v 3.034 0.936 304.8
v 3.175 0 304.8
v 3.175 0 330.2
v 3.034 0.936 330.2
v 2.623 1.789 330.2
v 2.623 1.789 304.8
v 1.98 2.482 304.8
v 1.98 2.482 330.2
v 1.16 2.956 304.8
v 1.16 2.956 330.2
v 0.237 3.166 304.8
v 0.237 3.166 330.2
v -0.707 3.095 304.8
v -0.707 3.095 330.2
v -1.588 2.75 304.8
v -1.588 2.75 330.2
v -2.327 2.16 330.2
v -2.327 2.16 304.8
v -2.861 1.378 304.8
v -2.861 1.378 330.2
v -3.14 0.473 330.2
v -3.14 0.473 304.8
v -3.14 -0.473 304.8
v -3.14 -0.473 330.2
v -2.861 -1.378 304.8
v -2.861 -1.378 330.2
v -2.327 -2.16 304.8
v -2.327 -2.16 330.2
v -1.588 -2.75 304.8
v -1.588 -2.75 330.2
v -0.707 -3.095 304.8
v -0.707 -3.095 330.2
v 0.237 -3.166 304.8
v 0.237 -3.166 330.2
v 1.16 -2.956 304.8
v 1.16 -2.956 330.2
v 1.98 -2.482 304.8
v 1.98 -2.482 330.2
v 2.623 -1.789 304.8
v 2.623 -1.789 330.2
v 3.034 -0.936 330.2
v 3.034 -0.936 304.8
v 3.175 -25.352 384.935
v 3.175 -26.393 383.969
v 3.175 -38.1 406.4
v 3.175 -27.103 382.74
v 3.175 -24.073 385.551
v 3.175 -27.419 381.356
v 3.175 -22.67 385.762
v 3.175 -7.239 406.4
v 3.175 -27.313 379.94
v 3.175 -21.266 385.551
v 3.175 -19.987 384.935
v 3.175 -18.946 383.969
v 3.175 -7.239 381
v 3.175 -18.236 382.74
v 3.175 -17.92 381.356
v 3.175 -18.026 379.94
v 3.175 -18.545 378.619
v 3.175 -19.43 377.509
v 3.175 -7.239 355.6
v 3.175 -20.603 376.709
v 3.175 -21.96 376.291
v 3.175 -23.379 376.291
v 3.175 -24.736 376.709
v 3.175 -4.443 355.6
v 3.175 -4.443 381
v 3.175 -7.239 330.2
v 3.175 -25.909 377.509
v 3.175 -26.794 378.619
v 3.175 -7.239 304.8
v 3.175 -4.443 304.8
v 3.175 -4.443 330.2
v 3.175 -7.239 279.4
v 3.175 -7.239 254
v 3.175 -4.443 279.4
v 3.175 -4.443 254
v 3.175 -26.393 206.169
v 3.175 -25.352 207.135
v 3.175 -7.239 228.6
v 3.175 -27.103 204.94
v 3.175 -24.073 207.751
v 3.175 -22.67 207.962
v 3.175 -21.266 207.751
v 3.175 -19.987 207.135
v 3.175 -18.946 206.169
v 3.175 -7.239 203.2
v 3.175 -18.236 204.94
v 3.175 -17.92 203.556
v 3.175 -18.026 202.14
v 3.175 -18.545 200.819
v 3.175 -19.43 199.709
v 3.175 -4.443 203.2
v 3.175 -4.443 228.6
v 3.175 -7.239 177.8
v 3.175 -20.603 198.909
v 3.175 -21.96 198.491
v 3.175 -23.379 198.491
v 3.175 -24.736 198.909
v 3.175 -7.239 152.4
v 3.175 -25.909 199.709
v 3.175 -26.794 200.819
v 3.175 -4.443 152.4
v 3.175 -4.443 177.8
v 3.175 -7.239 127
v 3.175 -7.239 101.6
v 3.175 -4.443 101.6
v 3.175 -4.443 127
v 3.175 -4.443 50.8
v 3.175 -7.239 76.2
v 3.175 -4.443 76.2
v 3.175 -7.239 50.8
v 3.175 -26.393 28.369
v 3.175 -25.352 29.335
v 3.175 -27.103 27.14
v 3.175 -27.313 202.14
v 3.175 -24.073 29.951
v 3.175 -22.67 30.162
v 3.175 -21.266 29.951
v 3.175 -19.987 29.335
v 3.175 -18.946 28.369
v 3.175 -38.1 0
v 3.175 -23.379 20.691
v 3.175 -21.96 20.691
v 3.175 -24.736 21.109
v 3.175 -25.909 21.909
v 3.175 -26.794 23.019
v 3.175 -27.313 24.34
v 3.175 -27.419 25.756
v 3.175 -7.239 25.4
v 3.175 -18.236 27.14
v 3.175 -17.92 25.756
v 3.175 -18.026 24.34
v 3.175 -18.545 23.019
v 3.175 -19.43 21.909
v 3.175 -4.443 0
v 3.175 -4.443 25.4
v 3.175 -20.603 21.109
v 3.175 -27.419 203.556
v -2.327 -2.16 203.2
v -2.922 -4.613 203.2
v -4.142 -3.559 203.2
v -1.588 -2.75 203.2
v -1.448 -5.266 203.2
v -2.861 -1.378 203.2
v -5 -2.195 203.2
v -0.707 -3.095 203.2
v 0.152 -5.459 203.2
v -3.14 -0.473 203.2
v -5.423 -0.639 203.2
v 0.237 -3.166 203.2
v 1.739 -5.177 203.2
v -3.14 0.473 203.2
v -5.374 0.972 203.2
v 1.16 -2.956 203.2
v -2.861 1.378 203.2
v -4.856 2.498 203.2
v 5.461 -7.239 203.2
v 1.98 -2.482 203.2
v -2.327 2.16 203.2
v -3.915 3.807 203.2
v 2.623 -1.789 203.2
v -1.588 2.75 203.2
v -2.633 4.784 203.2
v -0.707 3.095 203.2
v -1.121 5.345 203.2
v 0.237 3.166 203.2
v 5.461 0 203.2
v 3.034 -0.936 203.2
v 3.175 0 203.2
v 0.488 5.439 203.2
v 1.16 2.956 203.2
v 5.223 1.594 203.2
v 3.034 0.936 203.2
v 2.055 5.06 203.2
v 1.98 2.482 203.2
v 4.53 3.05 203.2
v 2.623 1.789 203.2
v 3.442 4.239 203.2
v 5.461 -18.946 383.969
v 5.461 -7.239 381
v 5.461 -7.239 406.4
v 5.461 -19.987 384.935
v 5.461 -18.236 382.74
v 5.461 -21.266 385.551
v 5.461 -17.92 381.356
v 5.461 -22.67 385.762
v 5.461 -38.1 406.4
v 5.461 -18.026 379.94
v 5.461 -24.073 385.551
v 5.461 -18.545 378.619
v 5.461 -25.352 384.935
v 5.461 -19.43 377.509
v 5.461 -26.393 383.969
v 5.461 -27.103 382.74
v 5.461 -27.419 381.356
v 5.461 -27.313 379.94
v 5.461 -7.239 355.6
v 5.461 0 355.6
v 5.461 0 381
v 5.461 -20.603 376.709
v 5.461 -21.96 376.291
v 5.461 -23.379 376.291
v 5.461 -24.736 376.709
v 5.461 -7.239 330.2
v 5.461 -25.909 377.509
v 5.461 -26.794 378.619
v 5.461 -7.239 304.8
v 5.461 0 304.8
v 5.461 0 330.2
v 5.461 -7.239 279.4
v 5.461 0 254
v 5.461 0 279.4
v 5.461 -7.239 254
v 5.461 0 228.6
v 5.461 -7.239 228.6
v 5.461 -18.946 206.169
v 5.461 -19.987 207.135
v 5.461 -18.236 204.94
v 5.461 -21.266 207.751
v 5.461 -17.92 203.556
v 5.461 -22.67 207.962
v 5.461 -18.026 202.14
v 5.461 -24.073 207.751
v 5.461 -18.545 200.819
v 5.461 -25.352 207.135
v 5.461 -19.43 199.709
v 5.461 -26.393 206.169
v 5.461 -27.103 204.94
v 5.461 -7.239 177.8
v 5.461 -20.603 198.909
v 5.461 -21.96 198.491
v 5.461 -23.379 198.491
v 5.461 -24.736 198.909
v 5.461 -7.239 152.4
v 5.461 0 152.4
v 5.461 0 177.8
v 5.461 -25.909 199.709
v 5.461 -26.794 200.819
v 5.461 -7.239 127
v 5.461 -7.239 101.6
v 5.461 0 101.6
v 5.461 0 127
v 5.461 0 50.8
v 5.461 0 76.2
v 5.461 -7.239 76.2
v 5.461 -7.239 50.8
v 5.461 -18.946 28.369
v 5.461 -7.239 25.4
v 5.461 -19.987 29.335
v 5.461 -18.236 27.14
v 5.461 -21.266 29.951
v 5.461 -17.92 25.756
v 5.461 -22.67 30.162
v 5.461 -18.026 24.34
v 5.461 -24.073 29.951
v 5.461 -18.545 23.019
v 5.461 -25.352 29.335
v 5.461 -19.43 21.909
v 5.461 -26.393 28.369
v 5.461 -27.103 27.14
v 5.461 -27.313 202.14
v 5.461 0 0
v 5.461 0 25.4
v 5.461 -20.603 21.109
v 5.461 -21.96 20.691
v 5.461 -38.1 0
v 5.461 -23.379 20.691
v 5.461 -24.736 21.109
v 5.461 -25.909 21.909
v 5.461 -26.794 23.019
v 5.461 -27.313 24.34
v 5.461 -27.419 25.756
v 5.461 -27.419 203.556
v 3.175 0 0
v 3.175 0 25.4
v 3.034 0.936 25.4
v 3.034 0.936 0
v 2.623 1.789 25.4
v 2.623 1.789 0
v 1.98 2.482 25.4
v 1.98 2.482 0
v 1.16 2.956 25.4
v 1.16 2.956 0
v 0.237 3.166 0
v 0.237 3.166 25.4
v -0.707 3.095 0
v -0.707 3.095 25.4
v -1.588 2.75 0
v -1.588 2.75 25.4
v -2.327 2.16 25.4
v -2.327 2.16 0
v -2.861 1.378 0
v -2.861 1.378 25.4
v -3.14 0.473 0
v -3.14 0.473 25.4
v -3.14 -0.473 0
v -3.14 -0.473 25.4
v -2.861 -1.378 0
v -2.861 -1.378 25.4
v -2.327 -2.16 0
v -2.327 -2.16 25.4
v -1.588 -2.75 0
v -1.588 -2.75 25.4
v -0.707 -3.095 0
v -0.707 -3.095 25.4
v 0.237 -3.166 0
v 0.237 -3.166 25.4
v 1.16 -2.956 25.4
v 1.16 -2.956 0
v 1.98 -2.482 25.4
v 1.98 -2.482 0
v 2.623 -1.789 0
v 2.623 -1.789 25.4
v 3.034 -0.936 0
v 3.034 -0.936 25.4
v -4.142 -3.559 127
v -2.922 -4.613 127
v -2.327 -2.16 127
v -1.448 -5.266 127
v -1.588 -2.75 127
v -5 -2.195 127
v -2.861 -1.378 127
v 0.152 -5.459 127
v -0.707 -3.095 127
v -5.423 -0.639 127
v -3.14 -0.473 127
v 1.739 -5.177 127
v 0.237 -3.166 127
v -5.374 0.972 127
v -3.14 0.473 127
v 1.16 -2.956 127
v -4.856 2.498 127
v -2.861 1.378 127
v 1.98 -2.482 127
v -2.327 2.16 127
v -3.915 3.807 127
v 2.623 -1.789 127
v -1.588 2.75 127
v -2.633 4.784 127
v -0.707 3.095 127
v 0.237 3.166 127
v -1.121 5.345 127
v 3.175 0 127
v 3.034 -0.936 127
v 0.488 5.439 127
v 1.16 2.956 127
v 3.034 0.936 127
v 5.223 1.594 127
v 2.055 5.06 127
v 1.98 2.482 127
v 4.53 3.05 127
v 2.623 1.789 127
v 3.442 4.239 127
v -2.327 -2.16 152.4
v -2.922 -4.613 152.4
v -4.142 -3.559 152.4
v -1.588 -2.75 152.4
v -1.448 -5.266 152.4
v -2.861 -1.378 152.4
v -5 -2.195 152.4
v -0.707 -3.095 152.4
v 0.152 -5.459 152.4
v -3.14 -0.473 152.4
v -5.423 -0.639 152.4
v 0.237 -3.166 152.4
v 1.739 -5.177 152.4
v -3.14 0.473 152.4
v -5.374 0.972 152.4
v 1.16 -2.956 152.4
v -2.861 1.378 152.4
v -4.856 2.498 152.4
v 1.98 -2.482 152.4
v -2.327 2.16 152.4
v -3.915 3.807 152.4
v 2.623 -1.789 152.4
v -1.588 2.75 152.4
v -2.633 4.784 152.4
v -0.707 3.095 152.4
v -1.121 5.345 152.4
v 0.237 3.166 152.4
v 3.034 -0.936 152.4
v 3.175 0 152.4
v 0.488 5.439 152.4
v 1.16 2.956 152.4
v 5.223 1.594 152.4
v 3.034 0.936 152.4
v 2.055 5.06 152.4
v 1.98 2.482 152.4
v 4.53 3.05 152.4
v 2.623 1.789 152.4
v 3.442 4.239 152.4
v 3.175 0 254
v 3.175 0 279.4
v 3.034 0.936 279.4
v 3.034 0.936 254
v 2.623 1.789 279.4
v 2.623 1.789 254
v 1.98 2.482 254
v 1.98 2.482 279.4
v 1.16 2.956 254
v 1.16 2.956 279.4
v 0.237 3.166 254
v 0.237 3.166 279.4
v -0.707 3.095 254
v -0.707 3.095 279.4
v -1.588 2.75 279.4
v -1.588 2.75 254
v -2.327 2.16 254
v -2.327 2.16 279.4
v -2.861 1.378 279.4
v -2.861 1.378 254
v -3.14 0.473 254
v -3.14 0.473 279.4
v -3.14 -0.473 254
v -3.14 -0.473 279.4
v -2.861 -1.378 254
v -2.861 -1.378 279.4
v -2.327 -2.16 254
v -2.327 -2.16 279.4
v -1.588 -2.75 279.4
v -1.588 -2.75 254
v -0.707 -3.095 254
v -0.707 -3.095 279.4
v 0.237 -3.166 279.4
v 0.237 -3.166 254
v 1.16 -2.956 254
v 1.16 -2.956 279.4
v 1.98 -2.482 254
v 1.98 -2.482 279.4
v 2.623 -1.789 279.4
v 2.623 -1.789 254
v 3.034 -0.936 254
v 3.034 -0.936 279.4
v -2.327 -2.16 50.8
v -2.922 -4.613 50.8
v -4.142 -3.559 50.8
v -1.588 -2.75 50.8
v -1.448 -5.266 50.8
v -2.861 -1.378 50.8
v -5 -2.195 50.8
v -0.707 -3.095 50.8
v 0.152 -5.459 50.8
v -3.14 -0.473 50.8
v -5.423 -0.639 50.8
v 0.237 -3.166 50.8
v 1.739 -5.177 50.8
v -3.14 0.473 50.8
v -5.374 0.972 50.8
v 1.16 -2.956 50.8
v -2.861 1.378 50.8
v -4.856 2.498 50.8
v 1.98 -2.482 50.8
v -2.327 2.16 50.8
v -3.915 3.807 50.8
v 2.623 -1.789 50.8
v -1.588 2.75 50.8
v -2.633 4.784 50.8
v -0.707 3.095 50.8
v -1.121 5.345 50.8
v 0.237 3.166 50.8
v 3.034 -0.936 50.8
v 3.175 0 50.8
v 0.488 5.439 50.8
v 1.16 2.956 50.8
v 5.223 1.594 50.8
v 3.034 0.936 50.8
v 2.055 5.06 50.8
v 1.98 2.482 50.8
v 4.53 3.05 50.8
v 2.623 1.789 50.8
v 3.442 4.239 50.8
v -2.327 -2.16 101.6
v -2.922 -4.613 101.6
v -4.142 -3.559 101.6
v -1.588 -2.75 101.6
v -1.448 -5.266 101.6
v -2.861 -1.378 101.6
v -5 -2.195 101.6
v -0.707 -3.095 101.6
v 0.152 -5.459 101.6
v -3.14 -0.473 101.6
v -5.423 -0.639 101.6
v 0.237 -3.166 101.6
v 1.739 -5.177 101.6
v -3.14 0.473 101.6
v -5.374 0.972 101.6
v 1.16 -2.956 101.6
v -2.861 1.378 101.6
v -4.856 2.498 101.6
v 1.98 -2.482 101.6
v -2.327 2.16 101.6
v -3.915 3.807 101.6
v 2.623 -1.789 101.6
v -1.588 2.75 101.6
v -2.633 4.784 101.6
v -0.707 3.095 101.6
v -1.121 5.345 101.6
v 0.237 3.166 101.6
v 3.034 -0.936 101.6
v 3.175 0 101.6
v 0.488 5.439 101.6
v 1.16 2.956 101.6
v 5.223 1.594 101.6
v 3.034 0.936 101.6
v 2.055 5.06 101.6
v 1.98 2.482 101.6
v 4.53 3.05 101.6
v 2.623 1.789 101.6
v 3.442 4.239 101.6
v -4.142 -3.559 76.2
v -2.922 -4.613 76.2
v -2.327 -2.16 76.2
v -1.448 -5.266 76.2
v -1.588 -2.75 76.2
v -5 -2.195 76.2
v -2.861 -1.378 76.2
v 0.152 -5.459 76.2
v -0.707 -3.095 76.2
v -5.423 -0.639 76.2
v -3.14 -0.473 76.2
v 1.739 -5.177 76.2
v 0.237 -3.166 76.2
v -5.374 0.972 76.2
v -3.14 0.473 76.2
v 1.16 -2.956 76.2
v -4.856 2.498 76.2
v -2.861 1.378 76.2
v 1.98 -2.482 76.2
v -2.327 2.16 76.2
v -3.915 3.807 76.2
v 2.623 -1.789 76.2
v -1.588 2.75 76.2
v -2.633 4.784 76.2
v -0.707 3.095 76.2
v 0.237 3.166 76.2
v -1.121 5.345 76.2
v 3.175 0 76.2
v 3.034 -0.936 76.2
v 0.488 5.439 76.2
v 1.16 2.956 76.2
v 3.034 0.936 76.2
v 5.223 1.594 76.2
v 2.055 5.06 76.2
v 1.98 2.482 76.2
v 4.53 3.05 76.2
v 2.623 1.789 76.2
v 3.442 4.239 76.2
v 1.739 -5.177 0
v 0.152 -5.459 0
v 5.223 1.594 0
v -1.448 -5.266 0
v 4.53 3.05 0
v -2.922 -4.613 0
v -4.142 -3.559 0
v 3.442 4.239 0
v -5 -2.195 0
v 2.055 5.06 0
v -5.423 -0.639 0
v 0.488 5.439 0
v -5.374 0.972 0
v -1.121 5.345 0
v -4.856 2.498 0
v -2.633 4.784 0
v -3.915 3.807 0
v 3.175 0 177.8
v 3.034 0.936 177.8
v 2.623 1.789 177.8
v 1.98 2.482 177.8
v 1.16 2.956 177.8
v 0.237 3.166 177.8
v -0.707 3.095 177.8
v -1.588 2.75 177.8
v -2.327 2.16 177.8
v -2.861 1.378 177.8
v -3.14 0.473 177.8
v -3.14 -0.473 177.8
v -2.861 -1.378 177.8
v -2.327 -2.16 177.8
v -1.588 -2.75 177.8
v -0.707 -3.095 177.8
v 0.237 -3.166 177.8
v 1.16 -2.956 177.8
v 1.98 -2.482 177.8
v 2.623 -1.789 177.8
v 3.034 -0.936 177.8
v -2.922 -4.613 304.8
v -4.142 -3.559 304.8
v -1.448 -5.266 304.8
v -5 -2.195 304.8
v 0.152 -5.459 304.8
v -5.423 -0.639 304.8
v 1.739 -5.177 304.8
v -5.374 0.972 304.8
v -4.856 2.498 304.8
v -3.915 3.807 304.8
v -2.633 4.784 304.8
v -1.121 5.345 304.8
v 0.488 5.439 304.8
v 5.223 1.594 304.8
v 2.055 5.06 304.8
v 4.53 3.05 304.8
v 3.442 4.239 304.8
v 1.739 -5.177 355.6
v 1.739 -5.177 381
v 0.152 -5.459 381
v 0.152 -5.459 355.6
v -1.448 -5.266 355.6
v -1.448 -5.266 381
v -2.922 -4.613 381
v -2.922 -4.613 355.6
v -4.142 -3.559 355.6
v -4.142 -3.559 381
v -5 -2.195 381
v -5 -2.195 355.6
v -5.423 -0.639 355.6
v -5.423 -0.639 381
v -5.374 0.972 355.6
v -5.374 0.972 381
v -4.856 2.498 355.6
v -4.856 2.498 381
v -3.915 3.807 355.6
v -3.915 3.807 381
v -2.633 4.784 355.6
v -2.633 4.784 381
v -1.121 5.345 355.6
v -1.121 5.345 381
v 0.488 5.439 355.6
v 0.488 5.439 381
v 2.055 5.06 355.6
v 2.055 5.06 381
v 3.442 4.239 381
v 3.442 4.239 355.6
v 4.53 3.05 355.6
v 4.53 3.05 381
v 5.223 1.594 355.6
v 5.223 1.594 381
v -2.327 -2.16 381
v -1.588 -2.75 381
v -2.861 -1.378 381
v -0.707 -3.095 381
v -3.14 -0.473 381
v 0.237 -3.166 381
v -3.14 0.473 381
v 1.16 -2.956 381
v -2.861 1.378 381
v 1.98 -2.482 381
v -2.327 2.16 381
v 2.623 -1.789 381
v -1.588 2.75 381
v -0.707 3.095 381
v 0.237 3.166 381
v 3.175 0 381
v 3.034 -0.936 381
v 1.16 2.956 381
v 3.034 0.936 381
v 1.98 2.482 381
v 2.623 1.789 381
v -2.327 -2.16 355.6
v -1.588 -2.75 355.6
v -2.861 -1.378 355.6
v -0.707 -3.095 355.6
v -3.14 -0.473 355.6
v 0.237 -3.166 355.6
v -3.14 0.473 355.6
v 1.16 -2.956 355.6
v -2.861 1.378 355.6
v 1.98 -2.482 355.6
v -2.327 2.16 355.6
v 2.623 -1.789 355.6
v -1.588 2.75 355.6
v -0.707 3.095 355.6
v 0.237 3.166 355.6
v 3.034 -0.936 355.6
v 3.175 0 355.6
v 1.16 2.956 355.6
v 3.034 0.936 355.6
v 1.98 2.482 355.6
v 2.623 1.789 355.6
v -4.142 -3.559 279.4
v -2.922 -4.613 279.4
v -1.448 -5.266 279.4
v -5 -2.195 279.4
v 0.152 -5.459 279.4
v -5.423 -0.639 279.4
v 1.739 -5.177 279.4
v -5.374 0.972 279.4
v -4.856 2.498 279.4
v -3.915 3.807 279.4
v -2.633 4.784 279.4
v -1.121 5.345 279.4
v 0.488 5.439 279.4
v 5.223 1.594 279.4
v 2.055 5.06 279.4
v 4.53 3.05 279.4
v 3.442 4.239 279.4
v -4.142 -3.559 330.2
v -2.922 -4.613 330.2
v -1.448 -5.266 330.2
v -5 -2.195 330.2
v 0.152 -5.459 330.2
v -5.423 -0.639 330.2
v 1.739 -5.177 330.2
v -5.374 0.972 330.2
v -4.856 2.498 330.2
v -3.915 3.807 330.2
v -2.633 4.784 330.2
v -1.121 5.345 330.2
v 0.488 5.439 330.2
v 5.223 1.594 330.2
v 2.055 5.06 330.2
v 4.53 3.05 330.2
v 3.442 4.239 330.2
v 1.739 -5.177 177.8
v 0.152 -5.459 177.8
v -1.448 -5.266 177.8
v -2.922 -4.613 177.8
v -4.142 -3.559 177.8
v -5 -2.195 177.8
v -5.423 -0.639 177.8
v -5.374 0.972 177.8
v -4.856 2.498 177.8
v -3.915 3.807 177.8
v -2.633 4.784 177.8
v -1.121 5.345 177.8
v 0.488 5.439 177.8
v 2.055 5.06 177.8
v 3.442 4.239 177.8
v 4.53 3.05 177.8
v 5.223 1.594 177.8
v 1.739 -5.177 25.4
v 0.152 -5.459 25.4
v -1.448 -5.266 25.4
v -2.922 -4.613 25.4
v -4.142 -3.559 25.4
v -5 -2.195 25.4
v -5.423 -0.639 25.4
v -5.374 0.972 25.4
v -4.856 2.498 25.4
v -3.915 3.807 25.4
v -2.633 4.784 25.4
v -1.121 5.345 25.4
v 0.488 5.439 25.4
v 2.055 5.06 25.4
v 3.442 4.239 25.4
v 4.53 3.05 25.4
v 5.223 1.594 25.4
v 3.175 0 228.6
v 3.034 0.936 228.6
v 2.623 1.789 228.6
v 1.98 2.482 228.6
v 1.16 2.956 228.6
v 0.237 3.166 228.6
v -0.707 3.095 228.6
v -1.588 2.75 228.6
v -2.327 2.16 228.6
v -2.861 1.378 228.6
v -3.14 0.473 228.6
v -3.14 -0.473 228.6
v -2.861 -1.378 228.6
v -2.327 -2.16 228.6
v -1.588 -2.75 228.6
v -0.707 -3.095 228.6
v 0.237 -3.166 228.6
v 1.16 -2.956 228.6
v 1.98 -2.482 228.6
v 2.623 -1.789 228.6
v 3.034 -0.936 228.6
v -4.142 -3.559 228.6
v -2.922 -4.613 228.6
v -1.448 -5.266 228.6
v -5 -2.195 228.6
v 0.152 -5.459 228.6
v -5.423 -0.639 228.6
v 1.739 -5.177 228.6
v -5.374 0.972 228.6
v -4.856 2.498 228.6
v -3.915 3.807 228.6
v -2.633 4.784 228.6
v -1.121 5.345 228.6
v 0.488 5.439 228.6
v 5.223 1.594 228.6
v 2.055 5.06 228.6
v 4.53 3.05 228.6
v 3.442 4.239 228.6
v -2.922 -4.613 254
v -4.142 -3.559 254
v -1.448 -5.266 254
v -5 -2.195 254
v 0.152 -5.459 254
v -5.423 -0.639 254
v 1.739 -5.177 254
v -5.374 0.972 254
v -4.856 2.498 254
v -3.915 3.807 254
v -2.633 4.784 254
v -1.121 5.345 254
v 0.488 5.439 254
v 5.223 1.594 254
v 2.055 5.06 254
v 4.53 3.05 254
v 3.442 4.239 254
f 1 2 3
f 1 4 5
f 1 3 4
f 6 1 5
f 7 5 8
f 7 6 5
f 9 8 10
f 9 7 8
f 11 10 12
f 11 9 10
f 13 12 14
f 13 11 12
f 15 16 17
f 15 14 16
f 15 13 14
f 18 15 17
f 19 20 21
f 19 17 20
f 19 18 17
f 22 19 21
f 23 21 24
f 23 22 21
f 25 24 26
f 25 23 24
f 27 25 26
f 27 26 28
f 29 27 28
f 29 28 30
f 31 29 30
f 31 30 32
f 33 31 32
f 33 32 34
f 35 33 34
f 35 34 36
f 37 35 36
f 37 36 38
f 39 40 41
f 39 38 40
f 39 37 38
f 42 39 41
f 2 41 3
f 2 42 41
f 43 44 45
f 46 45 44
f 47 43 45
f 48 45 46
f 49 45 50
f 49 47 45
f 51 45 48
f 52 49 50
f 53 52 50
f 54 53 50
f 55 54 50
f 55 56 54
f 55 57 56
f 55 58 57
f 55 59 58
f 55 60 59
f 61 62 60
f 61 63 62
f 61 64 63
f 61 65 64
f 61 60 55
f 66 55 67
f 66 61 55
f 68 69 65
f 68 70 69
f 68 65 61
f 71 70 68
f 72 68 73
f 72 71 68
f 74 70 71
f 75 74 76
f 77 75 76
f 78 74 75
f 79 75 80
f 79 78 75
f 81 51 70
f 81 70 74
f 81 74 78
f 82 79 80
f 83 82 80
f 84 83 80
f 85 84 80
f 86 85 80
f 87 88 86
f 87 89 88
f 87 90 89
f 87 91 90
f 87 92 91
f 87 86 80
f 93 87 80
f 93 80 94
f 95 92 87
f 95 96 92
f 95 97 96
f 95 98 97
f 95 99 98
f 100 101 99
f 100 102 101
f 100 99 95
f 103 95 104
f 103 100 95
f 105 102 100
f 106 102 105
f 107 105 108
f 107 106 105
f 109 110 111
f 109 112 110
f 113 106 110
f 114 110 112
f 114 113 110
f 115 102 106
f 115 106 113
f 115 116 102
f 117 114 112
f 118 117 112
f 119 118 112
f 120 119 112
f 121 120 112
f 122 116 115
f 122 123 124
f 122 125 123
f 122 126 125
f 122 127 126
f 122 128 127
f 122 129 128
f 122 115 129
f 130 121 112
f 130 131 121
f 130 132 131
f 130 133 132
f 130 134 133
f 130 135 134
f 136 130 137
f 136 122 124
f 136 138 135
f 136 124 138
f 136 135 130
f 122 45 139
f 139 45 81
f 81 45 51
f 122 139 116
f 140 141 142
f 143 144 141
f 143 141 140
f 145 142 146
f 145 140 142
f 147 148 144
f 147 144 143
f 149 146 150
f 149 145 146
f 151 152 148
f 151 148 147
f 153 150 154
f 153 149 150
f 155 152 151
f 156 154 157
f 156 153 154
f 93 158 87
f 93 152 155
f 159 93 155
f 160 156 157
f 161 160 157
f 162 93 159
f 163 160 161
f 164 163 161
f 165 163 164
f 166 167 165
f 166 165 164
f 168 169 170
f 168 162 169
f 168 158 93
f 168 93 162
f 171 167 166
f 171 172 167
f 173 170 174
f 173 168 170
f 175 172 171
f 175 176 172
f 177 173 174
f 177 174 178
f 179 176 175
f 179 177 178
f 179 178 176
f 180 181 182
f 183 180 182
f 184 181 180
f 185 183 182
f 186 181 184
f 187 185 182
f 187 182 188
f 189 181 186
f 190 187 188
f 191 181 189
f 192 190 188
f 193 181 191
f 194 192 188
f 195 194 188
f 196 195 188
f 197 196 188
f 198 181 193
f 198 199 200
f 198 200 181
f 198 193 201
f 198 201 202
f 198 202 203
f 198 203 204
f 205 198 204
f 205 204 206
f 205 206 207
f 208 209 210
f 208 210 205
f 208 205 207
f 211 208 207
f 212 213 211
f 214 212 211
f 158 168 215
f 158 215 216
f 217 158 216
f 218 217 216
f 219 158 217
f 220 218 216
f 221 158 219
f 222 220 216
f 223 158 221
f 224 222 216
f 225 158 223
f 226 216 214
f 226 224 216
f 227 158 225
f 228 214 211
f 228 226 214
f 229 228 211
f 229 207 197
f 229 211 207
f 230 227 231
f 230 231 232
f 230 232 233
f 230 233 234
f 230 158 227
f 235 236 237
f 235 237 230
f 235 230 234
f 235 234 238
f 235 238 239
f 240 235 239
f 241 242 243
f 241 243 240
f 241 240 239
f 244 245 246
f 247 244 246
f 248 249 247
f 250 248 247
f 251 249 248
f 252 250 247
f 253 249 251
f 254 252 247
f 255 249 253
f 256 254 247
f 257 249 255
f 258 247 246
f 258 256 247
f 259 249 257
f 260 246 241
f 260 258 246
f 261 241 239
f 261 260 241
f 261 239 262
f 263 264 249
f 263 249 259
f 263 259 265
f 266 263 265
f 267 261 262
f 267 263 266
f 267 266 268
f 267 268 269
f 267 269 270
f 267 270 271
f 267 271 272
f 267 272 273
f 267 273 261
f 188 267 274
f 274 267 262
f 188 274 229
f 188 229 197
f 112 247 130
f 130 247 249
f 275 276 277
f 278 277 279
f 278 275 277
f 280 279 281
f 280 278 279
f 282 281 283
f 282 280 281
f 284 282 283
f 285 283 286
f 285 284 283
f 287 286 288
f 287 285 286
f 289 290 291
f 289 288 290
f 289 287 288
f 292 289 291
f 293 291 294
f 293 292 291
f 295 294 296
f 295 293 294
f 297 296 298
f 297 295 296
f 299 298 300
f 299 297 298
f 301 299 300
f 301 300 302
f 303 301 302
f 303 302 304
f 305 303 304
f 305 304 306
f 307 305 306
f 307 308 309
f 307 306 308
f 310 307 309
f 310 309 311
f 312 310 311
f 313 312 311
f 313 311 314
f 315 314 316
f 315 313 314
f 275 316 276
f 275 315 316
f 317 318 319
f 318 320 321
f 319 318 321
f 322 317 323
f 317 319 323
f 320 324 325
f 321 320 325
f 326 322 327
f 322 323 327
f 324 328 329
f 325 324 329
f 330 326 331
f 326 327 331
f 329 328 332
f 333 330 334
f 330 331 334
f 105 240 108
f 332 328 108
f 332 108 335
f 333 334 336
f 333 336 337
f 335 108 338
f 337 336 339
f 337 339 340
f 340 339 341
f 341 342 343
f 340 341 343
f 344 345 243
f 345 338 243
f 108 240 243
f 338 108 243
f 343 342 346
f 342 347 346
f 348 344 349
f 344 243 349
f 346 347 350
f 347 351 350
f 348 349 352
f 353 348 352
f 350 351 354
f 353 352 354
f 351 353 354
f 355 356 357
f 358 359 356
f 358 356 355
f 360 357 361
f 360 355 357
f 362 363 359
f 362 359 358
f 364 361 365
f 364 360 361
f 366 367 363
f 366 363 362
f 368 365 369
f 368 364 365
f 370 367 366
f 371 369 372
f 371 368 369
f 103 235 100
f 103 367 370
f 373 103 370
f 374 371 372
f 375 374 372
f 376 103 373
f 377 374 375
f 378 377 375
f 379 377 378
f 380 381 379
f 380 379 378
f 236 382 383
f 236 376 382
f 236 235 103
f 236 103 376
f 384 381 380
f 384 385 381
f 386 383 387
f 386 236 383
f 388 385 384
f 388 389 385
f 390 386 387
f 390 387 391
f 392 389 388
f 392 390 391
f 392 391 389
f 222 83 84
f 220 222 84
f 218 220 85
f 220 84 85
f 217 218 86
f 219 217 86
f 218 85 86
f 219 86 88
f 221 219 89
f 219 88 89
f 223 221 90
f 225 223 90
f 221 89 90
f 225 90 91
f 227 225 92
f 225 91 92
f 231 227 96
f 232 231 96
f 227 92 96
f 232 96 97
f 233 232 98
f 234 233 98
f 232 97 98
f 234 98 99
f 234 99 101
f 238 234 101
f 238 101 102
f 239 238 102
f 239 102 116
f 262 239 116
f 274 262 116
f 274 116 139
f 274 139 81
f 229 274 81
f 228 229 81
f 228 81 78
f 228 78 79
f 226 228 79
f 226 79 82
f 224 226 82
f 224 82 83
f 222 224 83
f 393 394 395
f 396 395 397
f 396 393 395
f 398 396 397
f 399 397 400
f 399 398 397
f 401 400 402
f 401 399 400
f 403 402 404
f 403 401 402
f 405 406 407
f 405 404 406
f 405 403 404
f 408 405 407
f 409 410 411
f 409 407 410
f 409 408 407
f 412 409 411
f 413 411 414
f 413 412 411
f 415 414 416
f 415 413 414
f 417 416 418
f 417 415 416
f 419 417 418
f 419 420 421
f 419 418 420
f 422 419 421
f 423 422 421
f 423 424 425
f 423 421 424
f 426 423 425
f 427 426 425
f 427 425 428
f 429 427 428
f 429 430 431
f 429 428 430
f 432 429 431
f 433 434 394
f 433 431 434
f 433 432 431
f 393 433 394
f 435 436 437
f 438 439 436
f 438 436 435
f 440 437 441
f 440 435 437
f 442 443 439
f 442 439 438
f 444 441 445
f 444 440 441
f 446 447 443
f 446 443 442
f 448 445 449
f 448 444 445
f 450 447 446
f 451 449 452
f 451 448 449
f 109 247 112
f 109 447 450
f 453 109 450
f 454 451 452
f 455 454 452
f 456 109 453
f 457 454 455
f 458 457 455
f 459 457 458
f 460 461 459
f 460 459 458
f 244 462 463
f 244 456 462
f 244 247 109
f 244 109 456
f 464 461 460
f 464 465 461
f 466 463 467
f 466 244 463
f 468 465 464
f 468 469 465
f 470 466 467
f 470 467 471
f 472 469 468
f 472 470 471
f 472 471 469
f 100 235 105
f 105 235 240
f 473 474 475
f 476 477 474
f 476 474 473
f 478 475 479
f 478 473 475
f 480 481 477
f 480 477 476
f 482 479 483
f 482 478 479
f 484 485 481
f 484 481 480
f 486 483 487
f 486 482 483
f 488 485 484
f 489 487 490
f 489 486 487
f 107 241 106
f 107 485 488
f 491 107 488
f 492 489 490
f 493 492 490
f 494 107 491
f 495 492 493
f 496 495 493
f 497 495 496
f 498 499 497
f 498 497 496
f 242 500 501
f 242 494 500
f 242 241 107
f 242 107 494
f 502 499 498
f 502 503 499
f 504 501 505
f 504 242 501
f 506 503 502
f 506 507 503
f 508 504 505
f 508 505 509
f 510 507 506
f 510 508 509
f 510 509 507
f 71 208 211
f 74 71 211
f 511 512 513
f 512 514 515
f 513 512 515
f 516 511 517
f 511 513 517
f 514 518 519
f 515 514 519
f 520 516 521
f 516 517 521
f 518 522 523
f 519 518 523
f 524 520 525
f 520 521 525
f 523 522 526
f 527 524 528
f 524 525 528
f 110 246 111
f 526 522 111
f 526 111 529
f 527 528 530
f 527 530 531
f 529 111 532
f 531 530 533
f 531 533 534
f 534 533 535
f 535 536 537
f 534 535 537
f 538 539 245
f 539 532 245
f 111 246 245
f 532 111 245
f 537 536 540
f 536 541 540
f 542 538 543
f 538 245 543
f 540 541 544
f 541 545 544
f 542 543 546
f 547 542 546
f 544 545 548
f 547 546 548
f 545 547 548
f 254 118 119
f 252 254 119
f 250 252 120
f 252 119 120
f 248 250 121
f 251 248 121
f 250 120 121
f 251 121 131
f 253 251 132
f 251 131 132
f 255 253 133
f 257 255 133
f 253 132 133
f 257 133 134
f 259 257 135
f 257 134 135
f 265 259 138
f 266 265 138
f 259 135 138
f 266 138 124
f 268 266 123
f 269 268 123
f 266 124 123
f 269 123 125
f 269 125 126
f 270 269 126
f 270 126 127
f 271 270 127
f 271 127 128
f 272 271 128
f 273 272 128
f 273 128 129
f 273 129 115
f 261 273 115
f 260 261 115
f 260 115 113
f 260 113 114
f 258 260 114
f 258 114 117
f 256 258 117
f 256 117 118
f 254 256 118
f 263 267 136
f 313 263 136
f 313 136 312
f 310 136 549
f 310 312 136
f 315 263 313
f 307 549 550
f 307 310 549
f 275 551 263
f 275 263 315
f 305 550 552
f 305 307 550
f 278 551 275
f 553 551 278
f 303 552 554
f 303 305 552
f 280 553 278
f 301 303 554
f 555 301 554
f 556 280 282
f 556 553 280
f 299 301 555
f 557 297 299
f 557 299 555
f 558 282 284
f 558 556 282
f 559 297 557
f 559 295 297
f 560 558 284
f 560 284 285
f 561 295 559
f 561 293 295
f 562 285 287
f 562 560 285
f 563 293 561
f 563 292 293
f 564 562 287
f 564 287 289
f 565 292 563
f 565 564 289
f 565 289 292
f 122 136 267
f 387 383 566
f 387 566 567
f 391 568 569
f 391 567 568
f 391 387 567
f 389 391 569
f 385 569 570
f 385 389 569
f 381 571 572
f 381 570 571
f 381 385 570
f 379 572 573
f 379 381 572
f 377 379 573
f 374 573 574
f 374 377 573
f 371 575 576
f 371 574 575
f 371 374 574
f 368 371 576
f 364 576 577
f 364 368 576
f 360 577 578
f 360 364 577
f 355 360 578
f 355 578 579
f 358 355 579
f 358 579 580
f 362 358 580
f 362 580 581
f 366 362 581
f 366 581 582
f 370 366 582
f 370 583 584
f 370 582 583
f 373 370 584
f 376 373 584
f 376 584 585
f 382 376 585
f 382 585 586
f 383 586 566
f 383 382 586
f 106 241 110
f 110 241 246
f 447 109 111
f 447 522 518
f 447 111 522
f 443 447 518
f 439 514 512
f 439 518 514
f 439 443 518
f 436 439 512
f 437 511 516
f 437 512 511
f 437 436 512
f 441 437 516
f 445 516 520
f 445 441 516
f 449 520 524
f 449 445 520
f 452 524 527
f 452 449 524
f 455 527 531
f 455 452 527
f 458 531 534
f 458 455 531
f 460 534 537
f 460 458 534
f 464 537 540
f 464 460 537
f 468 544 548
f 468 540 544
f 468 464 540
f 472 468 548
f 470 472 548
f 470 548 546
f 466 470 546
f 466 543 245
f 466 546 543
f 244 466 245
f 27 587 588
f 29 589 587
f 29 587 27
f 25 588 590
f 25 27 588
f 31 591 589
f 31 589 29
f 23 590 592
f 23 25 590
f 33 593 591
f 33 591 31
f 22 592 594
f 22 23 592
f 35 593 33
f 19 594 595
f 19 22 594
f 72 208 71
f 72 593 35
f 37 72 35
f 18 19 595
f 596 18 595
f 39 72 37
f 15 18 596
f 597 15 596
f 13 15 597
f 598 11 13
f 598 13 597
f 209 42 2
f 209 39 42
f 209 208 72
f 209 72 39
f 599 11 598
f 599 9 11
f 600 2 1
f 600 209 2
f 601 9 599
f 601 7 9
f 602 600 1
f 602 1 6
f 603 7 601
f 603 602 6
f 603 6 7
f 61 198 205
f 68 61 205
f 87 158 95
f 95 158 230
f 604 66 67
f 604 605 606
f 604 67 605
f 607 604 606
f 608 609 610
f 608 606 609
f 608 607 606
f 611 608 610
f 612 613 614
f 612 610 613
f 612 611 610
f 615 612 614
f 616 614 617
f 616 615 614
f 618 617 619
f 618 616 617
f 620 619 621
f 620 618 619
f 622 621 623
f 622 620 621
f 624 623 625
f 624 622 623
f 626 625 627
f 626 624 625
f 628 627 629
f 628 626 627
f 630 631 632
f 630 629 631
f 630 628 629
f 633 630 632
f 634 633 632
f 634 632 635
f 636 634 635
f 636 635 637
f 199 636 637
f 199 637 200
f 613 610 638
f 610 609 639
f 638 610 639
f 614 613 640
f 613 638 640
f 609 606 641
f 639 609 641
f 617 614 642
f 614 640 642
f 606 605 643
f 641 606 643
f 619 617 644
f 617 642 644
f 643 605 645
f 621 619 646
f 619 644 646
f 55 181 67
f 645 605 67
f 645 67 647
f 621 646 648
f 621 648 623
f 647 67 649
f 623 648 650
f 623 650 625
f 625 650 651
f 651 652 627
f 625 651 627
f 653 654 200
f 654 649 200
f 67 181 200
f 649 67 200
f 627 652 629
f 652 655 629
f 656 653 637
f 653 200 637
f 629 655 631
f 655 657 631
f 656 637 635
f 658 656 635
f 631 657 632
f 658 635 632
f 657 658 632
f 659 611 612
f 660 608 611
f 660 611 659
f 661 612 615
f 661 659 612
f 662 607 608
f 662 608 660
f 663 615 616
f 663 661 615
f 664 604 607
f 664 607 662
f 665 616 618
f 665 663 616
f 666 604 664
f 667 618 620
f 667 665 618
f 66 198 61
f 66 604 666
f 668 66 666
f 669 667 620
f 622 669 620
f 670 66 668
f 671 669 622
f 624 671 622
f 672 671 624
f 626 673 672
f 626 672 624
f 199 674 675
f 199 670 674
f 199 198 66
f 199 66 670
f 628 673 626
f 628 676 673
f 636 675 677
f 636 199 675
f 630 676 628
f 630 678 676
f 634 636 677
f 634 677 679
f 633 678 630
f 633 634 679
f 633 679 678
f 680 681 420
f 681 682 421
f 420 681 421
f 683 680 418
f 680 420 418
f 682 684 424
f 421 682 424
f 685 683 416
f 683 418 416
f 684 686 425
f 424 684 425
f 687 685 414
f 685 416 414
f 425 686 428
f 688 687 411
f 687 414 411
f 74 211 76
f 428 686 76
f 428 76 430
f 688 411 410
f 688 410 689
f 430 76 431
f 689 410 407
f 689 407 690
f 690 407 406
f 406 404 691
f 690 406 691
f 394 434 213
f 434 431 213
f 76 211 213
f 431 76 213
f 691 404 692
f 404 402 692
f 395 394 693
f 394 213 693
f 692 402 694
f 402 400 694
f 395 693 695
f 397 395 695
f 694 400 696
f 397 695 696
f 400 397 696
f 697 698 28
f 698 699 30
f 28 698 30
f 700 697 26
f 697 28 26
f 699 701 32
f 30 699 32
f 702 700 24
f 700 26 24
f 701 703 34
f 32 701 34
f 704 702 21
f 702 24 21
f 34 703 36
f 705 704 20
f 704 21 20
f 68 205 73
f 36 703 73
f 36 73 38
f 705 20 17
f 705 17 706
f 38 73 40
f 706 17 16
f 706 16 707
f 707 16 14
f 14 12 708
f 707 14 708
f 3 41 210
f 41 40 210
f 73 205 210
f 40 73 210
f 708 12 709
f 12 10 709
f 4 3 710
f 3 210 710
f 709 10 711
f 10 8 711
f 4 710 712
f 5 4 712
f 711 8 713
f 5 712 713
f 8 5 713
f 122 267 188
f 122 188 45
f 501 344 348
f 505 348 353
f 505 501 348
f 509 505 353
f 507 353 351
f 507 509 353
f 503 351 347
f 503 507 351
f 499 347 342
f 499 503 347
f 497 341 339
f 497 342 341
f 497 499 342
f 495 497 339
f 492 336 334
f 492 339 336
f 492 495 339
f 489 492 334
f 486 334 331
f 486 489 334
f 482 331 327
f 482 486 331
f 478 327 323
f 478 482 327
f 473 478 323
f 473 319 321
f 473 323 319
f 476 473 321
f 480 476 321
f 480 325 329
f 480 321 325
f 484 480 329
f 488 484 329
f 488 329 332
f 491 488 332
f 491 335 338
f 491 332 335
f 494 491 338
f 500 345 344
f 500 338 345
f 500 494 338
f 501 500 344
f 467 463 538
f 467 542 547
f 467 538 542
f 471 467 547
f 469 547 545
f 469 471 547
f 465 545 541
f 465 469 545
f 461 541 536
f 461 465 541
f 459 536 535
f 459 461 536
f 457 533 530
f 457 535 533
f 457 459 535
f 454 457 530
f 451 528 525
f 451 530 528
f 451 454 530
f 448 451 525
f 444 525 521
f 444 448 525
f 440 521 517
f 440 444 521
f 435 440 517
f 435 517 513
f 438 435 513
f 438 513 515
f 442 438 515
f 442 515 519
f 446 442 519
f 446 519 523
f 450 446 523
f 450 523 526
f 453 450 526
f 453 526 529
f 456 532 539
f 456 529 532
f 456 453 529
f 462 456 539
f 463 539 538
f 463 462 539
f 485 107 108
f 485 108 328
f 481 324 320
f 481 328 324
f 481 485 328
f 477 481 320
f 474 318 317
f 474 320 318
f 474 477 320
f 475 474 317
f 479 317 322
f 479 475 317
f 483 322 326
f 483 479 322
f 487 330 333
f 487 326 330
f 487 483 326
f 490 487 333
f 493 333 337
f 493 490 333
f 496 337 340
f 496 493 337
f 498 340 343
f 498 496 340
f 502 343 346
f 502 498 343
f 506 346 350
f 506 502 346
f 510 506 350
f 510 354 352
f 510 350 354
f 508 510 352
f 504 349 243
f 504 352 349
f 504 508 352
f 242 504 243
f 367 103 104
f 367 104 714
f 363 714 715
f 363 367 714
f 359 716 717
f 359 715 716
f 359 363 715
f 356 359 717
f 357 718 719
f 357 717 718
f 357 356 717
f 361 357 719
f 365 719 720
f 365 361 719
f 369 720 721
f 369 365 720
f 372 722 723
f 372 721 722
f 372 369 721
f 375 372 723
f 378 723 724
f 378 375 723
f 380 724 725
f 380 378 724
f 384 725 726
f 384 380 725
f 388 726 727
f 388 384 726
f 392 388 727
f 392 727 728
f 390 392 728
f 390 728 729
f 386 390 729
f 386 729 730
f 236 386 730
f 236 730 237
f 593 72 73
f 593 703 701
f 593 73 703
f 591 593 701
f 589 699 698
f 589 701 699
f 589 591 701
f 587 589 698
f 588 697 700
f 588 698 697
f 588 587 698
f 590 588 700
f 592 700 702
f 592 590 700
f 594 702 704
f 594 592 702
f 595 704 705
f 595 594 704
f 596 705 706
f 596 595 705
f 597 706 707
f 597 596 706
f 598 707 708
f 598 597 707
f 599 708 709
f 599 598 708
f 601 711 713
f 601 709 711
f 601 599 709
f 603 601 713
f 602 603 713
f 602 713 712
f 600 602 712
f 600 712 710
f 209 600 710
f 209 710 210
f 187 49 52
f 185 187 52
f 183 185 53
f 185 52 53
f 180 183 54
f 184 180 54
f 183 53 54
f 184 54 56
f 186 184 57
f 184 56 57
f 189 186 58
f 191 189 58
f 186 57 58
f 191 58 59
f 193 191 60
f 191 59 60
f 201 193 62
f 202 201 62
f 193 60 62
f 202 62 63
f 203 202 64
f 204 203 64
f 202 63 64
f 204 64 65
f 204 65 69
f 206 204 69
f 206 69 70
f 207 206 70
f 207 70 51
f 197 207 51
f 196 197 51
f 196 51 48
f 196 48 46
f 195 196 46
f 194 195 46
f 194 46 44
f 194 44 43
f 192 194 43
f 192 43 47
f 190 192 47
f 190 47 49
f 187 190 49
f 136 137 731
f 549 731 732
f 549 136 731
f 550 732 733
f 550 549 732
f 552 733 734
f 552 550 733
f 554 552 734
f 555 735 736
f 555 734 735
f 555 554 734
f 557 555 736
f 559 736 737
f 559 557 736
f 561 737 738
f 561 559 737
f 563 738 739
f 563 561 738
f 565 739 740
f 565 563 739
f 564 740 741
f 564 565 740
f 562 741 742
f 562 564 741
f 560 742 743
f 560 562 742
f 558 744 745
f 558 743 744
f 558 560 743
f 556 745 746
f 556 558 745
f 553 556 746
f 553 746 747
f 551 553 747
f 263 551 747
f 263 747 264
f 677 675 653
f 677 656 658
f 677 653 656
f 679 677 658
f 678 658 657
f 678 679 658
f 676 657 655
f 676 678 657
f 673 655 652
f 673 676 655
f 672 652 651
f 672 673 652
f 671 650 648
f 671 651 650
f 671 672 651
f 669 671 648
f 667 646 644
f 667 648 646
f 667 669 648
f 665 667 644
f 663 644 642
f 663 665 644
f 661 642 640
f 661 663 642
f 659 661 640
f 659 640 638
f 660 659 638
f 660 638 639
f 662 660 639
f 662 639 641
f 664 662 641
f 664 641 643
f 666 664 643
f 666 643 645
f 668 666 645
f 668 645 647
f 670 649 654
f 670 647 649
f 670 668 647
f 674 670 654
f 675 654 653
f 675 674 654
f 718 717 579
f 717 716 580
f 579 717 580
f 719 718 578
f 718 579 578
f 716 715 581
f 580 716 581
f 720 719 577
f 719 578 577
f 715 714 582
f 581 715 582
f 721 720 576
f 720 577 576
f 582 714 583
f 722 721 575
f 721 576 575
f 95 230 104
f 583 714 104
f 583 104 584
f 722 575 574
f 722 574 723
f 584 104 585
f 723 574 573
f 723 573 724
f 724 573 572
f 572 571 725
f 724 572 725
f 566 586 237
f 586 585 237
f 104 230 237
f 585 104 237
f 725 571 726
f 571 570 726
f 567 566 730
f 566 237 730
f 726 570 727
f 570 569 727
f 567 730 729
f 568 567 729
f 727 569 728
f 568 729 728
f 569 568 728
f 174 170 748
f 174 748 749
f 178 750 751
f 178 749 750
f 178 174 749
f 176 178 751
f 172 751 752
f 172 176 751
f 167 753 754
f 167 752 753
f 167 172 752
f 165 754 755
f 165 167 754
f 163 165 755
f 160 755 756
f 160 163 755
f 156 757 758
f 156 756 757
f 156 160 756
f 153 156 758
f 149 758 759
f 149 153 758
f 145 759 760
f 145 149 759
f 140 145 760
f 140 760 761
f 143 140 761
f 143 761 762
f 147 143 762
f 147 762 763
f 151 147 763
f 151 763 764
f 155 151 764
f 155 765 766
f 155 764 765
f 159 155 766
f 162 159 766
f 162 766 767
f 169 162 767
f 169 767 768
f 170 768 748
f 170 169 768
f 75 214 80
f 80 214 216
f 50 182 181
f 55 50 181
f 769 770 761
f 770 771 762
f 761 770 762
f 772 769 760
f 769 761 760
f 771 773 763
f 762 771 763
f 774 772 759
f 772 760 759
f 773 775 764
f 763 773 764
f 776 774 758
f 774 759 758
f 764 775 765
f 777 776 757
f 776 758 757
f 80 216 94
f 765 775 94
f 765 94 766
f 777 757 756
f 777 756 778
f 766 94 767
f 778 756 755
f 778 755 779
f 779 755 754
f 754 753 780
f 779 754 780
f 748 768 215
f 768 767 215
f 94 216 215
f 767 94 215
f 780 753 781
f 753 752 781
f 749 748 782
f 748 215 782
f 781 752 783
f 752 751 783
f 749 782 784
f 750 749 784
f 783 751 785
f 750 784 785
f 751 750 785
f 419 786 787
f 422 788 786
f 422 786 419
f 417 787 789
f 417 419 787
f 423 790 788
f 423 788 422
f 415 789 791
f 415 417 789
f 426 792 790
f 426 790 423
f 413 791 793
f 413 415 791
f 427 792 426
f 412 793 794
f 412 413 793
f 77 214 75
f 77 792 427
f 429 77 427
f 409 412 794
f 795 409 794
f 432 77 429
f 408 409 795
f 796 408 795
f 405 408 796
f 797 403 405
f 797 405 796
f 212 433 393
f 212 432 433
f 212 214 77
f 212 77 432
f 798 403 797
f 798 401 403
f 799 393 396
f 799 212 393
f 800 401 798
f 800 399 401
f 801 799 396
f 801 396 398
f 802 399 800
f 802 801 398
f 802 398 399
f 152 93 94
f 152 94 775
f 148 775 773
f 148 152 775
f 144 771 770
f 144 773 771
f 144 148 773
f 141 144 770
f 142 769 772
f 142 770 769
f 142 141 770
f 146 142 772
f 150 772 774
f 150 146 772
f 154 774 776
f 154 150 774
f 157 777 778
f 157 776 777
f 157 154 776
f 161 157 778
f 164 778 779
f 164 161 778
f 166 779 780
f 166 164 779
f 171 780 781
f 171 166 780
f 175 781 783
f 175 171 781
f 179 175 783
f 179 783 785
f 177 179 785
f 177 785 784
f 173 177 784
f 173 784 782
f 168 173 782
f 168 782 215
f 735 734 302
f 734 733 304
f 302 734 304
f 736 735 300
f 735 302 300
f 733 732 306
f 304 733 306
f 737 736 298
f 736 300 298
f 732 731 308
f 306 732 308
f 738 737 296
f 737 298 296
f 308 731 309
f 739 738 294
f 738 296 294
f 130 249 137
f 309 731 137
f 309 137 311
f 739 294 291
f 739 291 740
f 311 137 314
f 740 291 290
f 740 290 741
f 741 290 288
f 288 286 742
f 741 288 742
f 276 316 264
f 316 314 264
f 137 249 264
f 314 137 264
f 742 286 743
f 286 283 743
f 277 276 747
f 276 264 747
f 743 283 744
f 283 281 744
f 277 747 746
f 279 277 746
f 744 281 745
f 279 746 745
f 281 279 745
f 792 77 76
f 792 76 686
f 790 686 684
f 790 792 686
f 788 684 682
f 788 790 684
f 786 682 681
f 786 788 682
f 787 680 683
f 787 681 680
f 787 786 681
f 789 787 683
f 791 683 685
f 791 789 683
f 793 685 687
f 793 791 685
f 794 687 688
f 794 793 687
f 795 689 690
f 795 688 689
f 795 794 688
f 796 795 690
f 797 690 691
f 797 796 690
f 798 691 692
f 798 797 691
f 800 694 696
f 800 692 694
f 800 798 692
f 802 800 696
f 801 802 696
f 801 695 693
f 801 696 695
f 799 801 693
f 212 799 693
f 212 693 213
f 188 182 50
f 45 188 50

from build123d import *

# Parameters (mm, degrees)
SKETCH1_R           = 3.175
BOSS_EXTRUDE1_DEPTH = 406.4
SKETCH2_W           = 25.4
SKETCH2_H           = 12.7
CUT_EXTRUDE1_DEPTH  = 11.922
LPATTERN1_COUNT     = 8
LPATTERN1_PITCH     = 50.8
SKETCH3_R           = 4.7625
CUT_EXTRUDE2_DEPTH  = 3.286


with BuildPart() as part:
    # Sketch1 → Boss-Extrude1 (new body)
    with BuildSketch(Plane.XY):
        with BuildLine():
            Line((5.461, 0), (5.461, -38.1))
            Line((5.461, -38.1), (3.175, -38.1))
            Line((3.175, -38.1), (3.175, -4.443185344))
            ThreePointArc((3.175, -4.443185344), (-4.855985791, 2.498384078), (5.461, 0))
        make_face()
        Circle(SKETCH1_R, mode=Mode.SUBTRACT)
    extrude(amount=BOSS_EXTRUDE1_DEPTH)

    # Sketch2 → Cut-Extrude1 (cut, through all)
    with BuildSketch(Plane(origin=(5.461, 0, 0), x_dir=(0, 0, -1), z_dir=(1, 0, 0))):
        with Locations((-393.7, -0.889)):
            Rectangle(SKETCH2_W, SKETCH2_H)
    cut_extrude1 = extrude(amount=-CUT_EXTRUDE1_DEPTH, mode=Mode.SUBTRACT)

    # LPattern1: Cut-Extrude1 ×8
    with Locations(*[(0, 0, -i * LPATTERN1_PITCH) for i in range(1, LPATTERN1_COUNT)]):
        add(cut_extrude1, mode=Mode.SUBTRACT)

    # Sketch3 → Cut-Extrude2 (cut, through all)
    with BuildSketch(Plane.ZY.offset(-3.175)):
        with Locations((25.4, -22.6695)):
            Circle(SKETCH3_R)
        with Locations((203.2, -22.6695)):
            Circle(SKETCH3_R)
        with Locations((381, -22.6695)):
            Circle(SKETCH3_R)
    extrude(amount=-CUT_EXTRUDE2_DEPTH, mode=Mode.SUBTRACT)


solid = part.part
